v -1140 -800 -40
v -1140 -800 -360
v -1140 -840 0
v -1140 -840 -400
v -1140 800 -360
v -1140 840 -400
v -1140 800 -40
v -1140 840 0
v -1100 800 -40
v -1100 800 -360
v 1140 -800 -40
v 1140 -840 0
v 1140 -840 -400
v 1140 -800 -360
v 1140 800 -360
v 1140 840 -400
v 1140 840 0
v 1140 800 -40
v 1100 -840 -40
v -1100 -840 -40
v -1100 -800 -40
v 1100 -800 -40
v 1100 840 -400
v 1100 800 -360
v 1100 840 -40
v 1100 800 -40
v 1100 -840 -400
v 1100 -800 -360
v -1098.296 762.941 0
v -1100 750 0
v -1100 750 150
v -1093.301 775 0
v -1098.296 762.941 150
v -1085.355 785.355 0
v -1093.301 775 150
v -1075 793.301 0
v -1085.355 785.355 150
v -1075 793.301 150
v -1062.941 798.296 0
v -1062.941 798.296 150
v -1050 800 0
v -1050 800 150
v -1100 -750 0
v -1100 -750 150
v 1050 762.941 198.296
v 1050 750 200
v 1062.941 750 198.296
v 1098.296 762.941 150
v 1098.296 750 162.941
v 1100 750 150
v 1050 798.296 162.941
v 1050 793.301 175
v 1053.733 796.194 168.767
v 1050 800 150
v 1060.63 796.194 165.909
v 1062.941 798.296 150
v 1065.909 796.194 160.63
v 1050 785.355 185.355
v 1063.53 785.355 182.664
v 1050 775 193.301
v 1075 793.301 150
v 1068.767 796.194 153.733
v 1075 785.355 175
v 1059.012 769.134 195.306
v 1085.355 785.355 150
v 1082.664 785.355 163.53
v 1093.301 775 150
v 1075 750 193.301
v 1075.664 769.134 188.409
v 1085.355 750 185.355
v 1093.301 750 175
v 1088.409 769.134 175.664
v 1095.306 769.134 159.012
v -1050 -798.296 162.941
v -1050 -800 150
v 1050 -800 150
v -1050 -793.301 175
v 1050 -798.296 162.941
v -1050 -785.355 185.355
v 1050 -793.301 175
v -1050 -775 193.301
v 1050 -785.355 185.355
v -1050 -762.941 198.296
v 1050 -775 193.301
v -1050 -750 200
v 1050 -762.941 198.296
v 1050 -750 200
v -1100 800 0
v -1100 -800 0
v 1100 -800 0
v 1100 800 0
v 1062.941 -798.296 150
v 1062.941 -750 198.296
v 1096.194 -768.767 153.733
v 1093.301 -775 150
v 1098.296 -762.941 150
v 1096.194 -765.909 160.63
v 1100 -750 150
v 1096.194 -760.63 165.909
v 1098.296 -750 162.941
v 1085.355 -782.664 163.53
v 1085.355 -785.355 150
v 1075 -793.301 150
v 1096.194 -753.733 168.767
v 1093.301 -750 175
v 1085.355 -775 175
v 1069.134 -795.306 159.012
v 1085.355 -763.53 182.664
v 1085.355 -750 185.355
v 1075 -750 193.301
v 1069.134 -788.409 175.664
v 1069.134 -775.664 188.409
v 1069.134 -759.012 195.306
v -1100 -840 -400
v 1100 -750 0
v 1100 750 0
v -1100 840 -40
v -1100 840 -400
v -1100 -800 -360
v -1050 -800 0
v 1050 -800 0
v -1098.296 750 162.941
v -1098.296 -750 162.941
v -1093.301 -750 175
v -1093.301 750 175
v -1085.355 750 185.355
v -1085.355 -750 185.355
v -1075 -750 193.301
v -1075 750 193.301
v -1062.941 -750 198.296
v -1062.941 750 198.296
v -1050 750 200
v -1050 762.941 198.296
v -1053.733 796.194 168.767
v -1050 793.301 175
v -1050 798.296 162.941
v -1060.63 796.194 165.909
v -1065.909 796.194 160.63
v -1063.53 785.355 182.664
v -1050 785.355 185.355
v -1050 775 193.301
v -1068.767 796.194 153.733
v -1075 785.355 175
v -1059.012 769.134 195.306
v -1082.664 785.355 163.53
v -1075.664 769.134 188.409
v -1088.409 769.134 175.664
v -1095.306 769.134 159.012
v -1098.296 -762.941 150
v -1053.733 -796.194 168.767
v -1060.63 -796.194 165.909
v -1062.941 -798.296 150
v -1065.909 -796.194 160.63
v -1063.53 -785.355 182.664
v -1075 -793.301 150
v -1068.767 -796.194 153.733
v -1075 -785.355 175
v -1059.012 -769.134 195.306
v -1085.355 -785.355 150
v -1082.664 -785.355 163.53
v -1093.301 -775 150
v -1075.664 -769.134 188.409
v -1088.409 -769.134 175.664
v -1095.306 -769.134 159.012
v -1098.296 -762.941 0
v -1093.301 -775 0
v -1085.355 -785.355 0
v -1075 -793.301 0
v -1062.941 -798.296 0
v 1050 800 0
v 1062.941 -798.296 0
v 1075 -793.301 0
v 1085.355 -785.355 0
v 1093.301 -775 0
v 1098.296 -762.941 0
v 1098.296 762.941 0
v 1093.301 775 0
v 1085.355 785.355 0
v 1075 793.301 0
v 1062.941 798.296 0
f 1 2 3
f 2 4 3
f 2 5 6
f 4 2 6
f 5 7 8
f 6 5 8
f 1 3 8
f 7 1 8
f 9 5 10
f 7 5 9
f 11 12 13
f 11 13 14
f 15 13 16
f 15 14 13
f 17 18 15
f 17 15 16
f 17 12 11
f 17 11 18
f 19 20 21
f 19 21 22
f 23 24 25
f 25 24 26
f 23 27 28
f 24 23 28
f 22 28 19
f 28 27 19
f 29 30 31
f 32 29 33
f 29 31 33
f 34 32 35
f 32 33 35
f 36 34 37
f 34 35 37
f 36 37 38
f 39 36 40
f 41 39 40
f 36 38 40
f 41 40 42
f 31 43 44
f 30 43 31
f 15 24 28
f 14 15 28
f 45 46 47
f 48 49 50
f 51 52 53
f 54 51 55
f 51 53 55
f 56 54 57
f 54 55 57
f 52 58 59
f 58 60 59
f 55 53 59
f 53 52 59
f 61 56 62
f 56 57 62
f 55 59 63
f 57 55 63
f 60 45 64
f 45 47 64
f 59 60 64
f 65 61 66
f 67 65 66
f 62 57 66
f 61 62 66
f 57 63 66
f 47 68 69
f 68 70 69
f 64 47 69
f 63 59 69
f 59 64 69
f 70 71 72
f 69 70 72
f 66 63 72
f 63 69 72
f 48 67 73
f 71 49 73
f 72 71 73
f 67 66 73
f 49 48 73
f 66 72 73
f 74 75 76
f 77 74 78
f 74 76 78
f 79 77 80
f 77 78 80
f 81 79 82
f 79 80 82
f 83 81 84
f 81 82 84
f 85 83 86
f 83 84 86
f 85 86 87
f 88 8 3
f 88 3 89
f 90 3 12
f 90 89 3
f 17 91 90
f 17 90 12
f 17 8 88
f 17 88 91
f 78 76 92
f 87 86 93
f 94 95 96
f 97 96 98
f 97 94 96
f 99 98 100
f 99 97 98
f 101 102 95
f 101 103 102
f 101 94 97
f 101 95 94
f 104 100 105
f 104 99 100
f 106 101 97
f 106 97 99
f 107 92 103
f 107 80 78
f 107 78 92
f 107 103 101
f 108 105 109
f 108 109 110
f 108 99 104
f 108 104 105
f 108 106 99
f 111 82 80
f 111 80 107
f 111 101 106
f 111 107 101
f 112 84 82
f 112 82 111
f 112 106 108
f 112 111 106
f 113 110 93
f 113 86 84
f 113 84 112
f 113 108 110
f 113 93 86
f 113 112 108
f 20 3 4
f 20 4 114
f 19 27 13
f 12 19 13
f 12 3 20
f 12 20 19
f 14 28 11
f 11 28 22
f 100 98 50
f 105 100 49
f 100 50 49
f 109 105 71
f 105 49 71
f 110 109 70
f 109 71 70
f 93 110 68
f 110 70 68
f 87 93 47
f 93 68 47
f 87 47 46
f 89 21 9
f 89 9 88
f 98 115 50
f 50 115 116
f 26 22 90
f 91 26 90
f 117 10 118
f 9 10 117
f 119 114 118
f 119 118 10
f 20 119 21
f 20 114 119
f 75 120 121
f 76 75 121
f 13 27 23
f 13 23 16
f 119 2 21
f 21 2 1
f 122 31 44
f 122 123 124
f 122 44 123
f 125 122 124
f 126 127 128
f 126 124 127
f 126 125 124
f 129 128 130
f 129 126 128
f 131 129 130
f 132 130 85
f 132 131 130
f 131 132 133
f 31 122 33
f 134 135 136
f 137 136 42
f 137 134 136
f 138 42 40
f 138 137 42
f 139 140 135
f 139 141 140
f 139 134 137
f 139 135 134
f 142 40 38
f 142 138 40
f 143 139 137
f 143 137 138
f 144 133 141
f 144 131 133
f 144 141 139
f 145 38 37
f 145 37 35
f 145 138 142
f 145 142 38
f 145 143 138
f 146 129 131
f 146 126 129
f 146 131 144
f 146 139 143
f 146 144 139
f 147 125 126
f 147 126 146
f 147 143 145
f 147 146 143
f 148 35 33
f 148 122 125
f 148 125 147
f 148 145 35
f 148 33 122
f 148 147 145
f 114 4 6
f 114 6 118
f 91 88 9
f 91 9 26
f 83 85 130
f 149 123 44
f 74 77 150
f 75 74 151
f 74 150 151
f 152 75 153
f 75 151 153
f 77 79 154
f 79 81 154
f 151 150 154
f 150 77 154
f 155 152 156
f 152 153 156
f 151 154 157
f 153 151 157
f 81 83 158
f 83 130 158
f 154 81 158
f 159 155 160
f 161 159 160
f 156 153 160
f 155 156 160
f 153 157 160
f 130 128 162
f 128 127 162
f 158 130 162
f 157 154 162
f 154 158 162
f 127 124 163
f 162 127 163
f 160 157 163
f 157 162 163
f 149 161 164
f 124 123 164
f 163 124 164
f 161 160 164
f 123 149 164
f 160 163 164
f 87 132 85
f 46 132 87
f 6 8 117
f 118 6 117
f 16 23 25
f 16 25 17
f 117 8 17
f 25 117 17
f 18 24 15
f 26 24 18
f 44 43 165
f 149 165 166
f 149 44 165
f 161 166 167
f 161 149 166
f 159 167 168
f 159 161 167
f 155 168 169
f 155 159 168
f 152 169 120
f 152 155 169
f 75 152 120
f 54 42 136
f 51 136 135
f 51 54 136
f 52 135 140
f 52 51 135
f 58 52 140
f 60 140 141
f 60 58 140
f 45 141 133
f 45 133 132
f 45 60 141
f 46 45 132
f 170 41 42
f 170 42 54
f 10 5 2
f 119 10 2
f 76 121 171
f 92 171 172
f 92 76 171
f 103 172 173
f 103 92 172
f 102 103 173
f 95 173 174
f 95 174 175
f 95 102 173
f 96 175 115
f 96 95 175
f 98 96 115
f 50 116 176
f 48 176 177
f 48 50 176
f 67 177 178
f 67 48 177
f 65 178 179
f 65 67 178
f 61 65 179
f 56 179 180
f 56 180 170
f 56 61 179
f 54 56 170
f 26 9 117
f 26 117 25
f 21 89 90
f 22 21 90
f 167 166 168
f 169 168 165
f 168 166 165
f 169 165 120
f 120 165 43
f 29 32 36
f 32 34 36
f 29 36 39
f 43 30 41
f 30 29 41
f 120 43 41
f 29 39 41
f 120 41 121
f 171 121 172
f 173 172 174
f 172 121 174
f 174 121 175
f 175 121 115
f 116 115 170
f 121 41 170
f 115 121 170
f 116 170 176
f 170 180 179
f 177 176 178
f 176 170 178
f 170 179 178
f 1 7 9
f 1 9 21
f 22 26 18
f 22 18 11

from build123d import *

# Parameters (mm, degrees)
F0_W     = 2280
F0_H     = 1680
F0_W_2   = 2200
F0_H_2   = 1600
F1_DEPTH = 400
F2_W     = 2200
F2_H     = 360
F3_DEPTH = 1680.001
F4_W     = 1600
F4_H     = 320
F5_DEPTH = 2280.001
F7_DEPTH = 200
F8_R     = 50


# Not quite as in the source:
# - the program builds the solid bodies; features that only make, move or delete a surface that nothing else refers to are left out


with BuildPart() as f1:
    # F0 (on Top) → F1 (new body)
    with BuildSketch(Plane.XY):
        Rectangle(F0_W, F0_H)
        Rectangle(F0_W_2, F0_H_2, mode=Mode.SUBTRACT)
    extrude(amount=-F1_DEPTH)

    # F2 (on face) → F3 (cut, through all)
    with BuildSketch(Plane.XZ.offset(840)):
        with Locations((0, -220)):
            Rectangle(F2_W, F2_H)
    extrude(amount=-F3_DEPTH, mode=Mode.SUBTRACT)

    # F4 (on face) → F5 (cut, through all)
    with BuildSketch(Plane(origin=(-1140, 0, 0), x_dir=(0, -1, 0), z_dir=(-1, 0, 0))):
        with Locations((0, -200)):
            Rectangle(F4_W, F4_H)
    extrude(amount=-F5_DEPTH, mode=Mode.SUBTRACT)


with BuildPart() as f7:
    # F0 (on Top) → F7 (new body)
    with BuildSketch(Plane.XY):
        Rectangle(F0_W_2, F0_H_2)
    extrude(amount=F7_DEPTH)

    # F8
    f8_edges = [f7.edges().sort_by_distance(p)[0] for p in [
        (-1100, 0, 200),
        (0, -800, 200),
        (-1100, -800, 100),
        (1100, -800, 100),
        (1100, 0, 200),
        (0, 800, 200),
        (1100, 800, 100),
        (-1100, 800, 100),
    ]]
    fillet(f8_edges, radius=F8_R)


solid = Compound([f1.part, f7.part])
